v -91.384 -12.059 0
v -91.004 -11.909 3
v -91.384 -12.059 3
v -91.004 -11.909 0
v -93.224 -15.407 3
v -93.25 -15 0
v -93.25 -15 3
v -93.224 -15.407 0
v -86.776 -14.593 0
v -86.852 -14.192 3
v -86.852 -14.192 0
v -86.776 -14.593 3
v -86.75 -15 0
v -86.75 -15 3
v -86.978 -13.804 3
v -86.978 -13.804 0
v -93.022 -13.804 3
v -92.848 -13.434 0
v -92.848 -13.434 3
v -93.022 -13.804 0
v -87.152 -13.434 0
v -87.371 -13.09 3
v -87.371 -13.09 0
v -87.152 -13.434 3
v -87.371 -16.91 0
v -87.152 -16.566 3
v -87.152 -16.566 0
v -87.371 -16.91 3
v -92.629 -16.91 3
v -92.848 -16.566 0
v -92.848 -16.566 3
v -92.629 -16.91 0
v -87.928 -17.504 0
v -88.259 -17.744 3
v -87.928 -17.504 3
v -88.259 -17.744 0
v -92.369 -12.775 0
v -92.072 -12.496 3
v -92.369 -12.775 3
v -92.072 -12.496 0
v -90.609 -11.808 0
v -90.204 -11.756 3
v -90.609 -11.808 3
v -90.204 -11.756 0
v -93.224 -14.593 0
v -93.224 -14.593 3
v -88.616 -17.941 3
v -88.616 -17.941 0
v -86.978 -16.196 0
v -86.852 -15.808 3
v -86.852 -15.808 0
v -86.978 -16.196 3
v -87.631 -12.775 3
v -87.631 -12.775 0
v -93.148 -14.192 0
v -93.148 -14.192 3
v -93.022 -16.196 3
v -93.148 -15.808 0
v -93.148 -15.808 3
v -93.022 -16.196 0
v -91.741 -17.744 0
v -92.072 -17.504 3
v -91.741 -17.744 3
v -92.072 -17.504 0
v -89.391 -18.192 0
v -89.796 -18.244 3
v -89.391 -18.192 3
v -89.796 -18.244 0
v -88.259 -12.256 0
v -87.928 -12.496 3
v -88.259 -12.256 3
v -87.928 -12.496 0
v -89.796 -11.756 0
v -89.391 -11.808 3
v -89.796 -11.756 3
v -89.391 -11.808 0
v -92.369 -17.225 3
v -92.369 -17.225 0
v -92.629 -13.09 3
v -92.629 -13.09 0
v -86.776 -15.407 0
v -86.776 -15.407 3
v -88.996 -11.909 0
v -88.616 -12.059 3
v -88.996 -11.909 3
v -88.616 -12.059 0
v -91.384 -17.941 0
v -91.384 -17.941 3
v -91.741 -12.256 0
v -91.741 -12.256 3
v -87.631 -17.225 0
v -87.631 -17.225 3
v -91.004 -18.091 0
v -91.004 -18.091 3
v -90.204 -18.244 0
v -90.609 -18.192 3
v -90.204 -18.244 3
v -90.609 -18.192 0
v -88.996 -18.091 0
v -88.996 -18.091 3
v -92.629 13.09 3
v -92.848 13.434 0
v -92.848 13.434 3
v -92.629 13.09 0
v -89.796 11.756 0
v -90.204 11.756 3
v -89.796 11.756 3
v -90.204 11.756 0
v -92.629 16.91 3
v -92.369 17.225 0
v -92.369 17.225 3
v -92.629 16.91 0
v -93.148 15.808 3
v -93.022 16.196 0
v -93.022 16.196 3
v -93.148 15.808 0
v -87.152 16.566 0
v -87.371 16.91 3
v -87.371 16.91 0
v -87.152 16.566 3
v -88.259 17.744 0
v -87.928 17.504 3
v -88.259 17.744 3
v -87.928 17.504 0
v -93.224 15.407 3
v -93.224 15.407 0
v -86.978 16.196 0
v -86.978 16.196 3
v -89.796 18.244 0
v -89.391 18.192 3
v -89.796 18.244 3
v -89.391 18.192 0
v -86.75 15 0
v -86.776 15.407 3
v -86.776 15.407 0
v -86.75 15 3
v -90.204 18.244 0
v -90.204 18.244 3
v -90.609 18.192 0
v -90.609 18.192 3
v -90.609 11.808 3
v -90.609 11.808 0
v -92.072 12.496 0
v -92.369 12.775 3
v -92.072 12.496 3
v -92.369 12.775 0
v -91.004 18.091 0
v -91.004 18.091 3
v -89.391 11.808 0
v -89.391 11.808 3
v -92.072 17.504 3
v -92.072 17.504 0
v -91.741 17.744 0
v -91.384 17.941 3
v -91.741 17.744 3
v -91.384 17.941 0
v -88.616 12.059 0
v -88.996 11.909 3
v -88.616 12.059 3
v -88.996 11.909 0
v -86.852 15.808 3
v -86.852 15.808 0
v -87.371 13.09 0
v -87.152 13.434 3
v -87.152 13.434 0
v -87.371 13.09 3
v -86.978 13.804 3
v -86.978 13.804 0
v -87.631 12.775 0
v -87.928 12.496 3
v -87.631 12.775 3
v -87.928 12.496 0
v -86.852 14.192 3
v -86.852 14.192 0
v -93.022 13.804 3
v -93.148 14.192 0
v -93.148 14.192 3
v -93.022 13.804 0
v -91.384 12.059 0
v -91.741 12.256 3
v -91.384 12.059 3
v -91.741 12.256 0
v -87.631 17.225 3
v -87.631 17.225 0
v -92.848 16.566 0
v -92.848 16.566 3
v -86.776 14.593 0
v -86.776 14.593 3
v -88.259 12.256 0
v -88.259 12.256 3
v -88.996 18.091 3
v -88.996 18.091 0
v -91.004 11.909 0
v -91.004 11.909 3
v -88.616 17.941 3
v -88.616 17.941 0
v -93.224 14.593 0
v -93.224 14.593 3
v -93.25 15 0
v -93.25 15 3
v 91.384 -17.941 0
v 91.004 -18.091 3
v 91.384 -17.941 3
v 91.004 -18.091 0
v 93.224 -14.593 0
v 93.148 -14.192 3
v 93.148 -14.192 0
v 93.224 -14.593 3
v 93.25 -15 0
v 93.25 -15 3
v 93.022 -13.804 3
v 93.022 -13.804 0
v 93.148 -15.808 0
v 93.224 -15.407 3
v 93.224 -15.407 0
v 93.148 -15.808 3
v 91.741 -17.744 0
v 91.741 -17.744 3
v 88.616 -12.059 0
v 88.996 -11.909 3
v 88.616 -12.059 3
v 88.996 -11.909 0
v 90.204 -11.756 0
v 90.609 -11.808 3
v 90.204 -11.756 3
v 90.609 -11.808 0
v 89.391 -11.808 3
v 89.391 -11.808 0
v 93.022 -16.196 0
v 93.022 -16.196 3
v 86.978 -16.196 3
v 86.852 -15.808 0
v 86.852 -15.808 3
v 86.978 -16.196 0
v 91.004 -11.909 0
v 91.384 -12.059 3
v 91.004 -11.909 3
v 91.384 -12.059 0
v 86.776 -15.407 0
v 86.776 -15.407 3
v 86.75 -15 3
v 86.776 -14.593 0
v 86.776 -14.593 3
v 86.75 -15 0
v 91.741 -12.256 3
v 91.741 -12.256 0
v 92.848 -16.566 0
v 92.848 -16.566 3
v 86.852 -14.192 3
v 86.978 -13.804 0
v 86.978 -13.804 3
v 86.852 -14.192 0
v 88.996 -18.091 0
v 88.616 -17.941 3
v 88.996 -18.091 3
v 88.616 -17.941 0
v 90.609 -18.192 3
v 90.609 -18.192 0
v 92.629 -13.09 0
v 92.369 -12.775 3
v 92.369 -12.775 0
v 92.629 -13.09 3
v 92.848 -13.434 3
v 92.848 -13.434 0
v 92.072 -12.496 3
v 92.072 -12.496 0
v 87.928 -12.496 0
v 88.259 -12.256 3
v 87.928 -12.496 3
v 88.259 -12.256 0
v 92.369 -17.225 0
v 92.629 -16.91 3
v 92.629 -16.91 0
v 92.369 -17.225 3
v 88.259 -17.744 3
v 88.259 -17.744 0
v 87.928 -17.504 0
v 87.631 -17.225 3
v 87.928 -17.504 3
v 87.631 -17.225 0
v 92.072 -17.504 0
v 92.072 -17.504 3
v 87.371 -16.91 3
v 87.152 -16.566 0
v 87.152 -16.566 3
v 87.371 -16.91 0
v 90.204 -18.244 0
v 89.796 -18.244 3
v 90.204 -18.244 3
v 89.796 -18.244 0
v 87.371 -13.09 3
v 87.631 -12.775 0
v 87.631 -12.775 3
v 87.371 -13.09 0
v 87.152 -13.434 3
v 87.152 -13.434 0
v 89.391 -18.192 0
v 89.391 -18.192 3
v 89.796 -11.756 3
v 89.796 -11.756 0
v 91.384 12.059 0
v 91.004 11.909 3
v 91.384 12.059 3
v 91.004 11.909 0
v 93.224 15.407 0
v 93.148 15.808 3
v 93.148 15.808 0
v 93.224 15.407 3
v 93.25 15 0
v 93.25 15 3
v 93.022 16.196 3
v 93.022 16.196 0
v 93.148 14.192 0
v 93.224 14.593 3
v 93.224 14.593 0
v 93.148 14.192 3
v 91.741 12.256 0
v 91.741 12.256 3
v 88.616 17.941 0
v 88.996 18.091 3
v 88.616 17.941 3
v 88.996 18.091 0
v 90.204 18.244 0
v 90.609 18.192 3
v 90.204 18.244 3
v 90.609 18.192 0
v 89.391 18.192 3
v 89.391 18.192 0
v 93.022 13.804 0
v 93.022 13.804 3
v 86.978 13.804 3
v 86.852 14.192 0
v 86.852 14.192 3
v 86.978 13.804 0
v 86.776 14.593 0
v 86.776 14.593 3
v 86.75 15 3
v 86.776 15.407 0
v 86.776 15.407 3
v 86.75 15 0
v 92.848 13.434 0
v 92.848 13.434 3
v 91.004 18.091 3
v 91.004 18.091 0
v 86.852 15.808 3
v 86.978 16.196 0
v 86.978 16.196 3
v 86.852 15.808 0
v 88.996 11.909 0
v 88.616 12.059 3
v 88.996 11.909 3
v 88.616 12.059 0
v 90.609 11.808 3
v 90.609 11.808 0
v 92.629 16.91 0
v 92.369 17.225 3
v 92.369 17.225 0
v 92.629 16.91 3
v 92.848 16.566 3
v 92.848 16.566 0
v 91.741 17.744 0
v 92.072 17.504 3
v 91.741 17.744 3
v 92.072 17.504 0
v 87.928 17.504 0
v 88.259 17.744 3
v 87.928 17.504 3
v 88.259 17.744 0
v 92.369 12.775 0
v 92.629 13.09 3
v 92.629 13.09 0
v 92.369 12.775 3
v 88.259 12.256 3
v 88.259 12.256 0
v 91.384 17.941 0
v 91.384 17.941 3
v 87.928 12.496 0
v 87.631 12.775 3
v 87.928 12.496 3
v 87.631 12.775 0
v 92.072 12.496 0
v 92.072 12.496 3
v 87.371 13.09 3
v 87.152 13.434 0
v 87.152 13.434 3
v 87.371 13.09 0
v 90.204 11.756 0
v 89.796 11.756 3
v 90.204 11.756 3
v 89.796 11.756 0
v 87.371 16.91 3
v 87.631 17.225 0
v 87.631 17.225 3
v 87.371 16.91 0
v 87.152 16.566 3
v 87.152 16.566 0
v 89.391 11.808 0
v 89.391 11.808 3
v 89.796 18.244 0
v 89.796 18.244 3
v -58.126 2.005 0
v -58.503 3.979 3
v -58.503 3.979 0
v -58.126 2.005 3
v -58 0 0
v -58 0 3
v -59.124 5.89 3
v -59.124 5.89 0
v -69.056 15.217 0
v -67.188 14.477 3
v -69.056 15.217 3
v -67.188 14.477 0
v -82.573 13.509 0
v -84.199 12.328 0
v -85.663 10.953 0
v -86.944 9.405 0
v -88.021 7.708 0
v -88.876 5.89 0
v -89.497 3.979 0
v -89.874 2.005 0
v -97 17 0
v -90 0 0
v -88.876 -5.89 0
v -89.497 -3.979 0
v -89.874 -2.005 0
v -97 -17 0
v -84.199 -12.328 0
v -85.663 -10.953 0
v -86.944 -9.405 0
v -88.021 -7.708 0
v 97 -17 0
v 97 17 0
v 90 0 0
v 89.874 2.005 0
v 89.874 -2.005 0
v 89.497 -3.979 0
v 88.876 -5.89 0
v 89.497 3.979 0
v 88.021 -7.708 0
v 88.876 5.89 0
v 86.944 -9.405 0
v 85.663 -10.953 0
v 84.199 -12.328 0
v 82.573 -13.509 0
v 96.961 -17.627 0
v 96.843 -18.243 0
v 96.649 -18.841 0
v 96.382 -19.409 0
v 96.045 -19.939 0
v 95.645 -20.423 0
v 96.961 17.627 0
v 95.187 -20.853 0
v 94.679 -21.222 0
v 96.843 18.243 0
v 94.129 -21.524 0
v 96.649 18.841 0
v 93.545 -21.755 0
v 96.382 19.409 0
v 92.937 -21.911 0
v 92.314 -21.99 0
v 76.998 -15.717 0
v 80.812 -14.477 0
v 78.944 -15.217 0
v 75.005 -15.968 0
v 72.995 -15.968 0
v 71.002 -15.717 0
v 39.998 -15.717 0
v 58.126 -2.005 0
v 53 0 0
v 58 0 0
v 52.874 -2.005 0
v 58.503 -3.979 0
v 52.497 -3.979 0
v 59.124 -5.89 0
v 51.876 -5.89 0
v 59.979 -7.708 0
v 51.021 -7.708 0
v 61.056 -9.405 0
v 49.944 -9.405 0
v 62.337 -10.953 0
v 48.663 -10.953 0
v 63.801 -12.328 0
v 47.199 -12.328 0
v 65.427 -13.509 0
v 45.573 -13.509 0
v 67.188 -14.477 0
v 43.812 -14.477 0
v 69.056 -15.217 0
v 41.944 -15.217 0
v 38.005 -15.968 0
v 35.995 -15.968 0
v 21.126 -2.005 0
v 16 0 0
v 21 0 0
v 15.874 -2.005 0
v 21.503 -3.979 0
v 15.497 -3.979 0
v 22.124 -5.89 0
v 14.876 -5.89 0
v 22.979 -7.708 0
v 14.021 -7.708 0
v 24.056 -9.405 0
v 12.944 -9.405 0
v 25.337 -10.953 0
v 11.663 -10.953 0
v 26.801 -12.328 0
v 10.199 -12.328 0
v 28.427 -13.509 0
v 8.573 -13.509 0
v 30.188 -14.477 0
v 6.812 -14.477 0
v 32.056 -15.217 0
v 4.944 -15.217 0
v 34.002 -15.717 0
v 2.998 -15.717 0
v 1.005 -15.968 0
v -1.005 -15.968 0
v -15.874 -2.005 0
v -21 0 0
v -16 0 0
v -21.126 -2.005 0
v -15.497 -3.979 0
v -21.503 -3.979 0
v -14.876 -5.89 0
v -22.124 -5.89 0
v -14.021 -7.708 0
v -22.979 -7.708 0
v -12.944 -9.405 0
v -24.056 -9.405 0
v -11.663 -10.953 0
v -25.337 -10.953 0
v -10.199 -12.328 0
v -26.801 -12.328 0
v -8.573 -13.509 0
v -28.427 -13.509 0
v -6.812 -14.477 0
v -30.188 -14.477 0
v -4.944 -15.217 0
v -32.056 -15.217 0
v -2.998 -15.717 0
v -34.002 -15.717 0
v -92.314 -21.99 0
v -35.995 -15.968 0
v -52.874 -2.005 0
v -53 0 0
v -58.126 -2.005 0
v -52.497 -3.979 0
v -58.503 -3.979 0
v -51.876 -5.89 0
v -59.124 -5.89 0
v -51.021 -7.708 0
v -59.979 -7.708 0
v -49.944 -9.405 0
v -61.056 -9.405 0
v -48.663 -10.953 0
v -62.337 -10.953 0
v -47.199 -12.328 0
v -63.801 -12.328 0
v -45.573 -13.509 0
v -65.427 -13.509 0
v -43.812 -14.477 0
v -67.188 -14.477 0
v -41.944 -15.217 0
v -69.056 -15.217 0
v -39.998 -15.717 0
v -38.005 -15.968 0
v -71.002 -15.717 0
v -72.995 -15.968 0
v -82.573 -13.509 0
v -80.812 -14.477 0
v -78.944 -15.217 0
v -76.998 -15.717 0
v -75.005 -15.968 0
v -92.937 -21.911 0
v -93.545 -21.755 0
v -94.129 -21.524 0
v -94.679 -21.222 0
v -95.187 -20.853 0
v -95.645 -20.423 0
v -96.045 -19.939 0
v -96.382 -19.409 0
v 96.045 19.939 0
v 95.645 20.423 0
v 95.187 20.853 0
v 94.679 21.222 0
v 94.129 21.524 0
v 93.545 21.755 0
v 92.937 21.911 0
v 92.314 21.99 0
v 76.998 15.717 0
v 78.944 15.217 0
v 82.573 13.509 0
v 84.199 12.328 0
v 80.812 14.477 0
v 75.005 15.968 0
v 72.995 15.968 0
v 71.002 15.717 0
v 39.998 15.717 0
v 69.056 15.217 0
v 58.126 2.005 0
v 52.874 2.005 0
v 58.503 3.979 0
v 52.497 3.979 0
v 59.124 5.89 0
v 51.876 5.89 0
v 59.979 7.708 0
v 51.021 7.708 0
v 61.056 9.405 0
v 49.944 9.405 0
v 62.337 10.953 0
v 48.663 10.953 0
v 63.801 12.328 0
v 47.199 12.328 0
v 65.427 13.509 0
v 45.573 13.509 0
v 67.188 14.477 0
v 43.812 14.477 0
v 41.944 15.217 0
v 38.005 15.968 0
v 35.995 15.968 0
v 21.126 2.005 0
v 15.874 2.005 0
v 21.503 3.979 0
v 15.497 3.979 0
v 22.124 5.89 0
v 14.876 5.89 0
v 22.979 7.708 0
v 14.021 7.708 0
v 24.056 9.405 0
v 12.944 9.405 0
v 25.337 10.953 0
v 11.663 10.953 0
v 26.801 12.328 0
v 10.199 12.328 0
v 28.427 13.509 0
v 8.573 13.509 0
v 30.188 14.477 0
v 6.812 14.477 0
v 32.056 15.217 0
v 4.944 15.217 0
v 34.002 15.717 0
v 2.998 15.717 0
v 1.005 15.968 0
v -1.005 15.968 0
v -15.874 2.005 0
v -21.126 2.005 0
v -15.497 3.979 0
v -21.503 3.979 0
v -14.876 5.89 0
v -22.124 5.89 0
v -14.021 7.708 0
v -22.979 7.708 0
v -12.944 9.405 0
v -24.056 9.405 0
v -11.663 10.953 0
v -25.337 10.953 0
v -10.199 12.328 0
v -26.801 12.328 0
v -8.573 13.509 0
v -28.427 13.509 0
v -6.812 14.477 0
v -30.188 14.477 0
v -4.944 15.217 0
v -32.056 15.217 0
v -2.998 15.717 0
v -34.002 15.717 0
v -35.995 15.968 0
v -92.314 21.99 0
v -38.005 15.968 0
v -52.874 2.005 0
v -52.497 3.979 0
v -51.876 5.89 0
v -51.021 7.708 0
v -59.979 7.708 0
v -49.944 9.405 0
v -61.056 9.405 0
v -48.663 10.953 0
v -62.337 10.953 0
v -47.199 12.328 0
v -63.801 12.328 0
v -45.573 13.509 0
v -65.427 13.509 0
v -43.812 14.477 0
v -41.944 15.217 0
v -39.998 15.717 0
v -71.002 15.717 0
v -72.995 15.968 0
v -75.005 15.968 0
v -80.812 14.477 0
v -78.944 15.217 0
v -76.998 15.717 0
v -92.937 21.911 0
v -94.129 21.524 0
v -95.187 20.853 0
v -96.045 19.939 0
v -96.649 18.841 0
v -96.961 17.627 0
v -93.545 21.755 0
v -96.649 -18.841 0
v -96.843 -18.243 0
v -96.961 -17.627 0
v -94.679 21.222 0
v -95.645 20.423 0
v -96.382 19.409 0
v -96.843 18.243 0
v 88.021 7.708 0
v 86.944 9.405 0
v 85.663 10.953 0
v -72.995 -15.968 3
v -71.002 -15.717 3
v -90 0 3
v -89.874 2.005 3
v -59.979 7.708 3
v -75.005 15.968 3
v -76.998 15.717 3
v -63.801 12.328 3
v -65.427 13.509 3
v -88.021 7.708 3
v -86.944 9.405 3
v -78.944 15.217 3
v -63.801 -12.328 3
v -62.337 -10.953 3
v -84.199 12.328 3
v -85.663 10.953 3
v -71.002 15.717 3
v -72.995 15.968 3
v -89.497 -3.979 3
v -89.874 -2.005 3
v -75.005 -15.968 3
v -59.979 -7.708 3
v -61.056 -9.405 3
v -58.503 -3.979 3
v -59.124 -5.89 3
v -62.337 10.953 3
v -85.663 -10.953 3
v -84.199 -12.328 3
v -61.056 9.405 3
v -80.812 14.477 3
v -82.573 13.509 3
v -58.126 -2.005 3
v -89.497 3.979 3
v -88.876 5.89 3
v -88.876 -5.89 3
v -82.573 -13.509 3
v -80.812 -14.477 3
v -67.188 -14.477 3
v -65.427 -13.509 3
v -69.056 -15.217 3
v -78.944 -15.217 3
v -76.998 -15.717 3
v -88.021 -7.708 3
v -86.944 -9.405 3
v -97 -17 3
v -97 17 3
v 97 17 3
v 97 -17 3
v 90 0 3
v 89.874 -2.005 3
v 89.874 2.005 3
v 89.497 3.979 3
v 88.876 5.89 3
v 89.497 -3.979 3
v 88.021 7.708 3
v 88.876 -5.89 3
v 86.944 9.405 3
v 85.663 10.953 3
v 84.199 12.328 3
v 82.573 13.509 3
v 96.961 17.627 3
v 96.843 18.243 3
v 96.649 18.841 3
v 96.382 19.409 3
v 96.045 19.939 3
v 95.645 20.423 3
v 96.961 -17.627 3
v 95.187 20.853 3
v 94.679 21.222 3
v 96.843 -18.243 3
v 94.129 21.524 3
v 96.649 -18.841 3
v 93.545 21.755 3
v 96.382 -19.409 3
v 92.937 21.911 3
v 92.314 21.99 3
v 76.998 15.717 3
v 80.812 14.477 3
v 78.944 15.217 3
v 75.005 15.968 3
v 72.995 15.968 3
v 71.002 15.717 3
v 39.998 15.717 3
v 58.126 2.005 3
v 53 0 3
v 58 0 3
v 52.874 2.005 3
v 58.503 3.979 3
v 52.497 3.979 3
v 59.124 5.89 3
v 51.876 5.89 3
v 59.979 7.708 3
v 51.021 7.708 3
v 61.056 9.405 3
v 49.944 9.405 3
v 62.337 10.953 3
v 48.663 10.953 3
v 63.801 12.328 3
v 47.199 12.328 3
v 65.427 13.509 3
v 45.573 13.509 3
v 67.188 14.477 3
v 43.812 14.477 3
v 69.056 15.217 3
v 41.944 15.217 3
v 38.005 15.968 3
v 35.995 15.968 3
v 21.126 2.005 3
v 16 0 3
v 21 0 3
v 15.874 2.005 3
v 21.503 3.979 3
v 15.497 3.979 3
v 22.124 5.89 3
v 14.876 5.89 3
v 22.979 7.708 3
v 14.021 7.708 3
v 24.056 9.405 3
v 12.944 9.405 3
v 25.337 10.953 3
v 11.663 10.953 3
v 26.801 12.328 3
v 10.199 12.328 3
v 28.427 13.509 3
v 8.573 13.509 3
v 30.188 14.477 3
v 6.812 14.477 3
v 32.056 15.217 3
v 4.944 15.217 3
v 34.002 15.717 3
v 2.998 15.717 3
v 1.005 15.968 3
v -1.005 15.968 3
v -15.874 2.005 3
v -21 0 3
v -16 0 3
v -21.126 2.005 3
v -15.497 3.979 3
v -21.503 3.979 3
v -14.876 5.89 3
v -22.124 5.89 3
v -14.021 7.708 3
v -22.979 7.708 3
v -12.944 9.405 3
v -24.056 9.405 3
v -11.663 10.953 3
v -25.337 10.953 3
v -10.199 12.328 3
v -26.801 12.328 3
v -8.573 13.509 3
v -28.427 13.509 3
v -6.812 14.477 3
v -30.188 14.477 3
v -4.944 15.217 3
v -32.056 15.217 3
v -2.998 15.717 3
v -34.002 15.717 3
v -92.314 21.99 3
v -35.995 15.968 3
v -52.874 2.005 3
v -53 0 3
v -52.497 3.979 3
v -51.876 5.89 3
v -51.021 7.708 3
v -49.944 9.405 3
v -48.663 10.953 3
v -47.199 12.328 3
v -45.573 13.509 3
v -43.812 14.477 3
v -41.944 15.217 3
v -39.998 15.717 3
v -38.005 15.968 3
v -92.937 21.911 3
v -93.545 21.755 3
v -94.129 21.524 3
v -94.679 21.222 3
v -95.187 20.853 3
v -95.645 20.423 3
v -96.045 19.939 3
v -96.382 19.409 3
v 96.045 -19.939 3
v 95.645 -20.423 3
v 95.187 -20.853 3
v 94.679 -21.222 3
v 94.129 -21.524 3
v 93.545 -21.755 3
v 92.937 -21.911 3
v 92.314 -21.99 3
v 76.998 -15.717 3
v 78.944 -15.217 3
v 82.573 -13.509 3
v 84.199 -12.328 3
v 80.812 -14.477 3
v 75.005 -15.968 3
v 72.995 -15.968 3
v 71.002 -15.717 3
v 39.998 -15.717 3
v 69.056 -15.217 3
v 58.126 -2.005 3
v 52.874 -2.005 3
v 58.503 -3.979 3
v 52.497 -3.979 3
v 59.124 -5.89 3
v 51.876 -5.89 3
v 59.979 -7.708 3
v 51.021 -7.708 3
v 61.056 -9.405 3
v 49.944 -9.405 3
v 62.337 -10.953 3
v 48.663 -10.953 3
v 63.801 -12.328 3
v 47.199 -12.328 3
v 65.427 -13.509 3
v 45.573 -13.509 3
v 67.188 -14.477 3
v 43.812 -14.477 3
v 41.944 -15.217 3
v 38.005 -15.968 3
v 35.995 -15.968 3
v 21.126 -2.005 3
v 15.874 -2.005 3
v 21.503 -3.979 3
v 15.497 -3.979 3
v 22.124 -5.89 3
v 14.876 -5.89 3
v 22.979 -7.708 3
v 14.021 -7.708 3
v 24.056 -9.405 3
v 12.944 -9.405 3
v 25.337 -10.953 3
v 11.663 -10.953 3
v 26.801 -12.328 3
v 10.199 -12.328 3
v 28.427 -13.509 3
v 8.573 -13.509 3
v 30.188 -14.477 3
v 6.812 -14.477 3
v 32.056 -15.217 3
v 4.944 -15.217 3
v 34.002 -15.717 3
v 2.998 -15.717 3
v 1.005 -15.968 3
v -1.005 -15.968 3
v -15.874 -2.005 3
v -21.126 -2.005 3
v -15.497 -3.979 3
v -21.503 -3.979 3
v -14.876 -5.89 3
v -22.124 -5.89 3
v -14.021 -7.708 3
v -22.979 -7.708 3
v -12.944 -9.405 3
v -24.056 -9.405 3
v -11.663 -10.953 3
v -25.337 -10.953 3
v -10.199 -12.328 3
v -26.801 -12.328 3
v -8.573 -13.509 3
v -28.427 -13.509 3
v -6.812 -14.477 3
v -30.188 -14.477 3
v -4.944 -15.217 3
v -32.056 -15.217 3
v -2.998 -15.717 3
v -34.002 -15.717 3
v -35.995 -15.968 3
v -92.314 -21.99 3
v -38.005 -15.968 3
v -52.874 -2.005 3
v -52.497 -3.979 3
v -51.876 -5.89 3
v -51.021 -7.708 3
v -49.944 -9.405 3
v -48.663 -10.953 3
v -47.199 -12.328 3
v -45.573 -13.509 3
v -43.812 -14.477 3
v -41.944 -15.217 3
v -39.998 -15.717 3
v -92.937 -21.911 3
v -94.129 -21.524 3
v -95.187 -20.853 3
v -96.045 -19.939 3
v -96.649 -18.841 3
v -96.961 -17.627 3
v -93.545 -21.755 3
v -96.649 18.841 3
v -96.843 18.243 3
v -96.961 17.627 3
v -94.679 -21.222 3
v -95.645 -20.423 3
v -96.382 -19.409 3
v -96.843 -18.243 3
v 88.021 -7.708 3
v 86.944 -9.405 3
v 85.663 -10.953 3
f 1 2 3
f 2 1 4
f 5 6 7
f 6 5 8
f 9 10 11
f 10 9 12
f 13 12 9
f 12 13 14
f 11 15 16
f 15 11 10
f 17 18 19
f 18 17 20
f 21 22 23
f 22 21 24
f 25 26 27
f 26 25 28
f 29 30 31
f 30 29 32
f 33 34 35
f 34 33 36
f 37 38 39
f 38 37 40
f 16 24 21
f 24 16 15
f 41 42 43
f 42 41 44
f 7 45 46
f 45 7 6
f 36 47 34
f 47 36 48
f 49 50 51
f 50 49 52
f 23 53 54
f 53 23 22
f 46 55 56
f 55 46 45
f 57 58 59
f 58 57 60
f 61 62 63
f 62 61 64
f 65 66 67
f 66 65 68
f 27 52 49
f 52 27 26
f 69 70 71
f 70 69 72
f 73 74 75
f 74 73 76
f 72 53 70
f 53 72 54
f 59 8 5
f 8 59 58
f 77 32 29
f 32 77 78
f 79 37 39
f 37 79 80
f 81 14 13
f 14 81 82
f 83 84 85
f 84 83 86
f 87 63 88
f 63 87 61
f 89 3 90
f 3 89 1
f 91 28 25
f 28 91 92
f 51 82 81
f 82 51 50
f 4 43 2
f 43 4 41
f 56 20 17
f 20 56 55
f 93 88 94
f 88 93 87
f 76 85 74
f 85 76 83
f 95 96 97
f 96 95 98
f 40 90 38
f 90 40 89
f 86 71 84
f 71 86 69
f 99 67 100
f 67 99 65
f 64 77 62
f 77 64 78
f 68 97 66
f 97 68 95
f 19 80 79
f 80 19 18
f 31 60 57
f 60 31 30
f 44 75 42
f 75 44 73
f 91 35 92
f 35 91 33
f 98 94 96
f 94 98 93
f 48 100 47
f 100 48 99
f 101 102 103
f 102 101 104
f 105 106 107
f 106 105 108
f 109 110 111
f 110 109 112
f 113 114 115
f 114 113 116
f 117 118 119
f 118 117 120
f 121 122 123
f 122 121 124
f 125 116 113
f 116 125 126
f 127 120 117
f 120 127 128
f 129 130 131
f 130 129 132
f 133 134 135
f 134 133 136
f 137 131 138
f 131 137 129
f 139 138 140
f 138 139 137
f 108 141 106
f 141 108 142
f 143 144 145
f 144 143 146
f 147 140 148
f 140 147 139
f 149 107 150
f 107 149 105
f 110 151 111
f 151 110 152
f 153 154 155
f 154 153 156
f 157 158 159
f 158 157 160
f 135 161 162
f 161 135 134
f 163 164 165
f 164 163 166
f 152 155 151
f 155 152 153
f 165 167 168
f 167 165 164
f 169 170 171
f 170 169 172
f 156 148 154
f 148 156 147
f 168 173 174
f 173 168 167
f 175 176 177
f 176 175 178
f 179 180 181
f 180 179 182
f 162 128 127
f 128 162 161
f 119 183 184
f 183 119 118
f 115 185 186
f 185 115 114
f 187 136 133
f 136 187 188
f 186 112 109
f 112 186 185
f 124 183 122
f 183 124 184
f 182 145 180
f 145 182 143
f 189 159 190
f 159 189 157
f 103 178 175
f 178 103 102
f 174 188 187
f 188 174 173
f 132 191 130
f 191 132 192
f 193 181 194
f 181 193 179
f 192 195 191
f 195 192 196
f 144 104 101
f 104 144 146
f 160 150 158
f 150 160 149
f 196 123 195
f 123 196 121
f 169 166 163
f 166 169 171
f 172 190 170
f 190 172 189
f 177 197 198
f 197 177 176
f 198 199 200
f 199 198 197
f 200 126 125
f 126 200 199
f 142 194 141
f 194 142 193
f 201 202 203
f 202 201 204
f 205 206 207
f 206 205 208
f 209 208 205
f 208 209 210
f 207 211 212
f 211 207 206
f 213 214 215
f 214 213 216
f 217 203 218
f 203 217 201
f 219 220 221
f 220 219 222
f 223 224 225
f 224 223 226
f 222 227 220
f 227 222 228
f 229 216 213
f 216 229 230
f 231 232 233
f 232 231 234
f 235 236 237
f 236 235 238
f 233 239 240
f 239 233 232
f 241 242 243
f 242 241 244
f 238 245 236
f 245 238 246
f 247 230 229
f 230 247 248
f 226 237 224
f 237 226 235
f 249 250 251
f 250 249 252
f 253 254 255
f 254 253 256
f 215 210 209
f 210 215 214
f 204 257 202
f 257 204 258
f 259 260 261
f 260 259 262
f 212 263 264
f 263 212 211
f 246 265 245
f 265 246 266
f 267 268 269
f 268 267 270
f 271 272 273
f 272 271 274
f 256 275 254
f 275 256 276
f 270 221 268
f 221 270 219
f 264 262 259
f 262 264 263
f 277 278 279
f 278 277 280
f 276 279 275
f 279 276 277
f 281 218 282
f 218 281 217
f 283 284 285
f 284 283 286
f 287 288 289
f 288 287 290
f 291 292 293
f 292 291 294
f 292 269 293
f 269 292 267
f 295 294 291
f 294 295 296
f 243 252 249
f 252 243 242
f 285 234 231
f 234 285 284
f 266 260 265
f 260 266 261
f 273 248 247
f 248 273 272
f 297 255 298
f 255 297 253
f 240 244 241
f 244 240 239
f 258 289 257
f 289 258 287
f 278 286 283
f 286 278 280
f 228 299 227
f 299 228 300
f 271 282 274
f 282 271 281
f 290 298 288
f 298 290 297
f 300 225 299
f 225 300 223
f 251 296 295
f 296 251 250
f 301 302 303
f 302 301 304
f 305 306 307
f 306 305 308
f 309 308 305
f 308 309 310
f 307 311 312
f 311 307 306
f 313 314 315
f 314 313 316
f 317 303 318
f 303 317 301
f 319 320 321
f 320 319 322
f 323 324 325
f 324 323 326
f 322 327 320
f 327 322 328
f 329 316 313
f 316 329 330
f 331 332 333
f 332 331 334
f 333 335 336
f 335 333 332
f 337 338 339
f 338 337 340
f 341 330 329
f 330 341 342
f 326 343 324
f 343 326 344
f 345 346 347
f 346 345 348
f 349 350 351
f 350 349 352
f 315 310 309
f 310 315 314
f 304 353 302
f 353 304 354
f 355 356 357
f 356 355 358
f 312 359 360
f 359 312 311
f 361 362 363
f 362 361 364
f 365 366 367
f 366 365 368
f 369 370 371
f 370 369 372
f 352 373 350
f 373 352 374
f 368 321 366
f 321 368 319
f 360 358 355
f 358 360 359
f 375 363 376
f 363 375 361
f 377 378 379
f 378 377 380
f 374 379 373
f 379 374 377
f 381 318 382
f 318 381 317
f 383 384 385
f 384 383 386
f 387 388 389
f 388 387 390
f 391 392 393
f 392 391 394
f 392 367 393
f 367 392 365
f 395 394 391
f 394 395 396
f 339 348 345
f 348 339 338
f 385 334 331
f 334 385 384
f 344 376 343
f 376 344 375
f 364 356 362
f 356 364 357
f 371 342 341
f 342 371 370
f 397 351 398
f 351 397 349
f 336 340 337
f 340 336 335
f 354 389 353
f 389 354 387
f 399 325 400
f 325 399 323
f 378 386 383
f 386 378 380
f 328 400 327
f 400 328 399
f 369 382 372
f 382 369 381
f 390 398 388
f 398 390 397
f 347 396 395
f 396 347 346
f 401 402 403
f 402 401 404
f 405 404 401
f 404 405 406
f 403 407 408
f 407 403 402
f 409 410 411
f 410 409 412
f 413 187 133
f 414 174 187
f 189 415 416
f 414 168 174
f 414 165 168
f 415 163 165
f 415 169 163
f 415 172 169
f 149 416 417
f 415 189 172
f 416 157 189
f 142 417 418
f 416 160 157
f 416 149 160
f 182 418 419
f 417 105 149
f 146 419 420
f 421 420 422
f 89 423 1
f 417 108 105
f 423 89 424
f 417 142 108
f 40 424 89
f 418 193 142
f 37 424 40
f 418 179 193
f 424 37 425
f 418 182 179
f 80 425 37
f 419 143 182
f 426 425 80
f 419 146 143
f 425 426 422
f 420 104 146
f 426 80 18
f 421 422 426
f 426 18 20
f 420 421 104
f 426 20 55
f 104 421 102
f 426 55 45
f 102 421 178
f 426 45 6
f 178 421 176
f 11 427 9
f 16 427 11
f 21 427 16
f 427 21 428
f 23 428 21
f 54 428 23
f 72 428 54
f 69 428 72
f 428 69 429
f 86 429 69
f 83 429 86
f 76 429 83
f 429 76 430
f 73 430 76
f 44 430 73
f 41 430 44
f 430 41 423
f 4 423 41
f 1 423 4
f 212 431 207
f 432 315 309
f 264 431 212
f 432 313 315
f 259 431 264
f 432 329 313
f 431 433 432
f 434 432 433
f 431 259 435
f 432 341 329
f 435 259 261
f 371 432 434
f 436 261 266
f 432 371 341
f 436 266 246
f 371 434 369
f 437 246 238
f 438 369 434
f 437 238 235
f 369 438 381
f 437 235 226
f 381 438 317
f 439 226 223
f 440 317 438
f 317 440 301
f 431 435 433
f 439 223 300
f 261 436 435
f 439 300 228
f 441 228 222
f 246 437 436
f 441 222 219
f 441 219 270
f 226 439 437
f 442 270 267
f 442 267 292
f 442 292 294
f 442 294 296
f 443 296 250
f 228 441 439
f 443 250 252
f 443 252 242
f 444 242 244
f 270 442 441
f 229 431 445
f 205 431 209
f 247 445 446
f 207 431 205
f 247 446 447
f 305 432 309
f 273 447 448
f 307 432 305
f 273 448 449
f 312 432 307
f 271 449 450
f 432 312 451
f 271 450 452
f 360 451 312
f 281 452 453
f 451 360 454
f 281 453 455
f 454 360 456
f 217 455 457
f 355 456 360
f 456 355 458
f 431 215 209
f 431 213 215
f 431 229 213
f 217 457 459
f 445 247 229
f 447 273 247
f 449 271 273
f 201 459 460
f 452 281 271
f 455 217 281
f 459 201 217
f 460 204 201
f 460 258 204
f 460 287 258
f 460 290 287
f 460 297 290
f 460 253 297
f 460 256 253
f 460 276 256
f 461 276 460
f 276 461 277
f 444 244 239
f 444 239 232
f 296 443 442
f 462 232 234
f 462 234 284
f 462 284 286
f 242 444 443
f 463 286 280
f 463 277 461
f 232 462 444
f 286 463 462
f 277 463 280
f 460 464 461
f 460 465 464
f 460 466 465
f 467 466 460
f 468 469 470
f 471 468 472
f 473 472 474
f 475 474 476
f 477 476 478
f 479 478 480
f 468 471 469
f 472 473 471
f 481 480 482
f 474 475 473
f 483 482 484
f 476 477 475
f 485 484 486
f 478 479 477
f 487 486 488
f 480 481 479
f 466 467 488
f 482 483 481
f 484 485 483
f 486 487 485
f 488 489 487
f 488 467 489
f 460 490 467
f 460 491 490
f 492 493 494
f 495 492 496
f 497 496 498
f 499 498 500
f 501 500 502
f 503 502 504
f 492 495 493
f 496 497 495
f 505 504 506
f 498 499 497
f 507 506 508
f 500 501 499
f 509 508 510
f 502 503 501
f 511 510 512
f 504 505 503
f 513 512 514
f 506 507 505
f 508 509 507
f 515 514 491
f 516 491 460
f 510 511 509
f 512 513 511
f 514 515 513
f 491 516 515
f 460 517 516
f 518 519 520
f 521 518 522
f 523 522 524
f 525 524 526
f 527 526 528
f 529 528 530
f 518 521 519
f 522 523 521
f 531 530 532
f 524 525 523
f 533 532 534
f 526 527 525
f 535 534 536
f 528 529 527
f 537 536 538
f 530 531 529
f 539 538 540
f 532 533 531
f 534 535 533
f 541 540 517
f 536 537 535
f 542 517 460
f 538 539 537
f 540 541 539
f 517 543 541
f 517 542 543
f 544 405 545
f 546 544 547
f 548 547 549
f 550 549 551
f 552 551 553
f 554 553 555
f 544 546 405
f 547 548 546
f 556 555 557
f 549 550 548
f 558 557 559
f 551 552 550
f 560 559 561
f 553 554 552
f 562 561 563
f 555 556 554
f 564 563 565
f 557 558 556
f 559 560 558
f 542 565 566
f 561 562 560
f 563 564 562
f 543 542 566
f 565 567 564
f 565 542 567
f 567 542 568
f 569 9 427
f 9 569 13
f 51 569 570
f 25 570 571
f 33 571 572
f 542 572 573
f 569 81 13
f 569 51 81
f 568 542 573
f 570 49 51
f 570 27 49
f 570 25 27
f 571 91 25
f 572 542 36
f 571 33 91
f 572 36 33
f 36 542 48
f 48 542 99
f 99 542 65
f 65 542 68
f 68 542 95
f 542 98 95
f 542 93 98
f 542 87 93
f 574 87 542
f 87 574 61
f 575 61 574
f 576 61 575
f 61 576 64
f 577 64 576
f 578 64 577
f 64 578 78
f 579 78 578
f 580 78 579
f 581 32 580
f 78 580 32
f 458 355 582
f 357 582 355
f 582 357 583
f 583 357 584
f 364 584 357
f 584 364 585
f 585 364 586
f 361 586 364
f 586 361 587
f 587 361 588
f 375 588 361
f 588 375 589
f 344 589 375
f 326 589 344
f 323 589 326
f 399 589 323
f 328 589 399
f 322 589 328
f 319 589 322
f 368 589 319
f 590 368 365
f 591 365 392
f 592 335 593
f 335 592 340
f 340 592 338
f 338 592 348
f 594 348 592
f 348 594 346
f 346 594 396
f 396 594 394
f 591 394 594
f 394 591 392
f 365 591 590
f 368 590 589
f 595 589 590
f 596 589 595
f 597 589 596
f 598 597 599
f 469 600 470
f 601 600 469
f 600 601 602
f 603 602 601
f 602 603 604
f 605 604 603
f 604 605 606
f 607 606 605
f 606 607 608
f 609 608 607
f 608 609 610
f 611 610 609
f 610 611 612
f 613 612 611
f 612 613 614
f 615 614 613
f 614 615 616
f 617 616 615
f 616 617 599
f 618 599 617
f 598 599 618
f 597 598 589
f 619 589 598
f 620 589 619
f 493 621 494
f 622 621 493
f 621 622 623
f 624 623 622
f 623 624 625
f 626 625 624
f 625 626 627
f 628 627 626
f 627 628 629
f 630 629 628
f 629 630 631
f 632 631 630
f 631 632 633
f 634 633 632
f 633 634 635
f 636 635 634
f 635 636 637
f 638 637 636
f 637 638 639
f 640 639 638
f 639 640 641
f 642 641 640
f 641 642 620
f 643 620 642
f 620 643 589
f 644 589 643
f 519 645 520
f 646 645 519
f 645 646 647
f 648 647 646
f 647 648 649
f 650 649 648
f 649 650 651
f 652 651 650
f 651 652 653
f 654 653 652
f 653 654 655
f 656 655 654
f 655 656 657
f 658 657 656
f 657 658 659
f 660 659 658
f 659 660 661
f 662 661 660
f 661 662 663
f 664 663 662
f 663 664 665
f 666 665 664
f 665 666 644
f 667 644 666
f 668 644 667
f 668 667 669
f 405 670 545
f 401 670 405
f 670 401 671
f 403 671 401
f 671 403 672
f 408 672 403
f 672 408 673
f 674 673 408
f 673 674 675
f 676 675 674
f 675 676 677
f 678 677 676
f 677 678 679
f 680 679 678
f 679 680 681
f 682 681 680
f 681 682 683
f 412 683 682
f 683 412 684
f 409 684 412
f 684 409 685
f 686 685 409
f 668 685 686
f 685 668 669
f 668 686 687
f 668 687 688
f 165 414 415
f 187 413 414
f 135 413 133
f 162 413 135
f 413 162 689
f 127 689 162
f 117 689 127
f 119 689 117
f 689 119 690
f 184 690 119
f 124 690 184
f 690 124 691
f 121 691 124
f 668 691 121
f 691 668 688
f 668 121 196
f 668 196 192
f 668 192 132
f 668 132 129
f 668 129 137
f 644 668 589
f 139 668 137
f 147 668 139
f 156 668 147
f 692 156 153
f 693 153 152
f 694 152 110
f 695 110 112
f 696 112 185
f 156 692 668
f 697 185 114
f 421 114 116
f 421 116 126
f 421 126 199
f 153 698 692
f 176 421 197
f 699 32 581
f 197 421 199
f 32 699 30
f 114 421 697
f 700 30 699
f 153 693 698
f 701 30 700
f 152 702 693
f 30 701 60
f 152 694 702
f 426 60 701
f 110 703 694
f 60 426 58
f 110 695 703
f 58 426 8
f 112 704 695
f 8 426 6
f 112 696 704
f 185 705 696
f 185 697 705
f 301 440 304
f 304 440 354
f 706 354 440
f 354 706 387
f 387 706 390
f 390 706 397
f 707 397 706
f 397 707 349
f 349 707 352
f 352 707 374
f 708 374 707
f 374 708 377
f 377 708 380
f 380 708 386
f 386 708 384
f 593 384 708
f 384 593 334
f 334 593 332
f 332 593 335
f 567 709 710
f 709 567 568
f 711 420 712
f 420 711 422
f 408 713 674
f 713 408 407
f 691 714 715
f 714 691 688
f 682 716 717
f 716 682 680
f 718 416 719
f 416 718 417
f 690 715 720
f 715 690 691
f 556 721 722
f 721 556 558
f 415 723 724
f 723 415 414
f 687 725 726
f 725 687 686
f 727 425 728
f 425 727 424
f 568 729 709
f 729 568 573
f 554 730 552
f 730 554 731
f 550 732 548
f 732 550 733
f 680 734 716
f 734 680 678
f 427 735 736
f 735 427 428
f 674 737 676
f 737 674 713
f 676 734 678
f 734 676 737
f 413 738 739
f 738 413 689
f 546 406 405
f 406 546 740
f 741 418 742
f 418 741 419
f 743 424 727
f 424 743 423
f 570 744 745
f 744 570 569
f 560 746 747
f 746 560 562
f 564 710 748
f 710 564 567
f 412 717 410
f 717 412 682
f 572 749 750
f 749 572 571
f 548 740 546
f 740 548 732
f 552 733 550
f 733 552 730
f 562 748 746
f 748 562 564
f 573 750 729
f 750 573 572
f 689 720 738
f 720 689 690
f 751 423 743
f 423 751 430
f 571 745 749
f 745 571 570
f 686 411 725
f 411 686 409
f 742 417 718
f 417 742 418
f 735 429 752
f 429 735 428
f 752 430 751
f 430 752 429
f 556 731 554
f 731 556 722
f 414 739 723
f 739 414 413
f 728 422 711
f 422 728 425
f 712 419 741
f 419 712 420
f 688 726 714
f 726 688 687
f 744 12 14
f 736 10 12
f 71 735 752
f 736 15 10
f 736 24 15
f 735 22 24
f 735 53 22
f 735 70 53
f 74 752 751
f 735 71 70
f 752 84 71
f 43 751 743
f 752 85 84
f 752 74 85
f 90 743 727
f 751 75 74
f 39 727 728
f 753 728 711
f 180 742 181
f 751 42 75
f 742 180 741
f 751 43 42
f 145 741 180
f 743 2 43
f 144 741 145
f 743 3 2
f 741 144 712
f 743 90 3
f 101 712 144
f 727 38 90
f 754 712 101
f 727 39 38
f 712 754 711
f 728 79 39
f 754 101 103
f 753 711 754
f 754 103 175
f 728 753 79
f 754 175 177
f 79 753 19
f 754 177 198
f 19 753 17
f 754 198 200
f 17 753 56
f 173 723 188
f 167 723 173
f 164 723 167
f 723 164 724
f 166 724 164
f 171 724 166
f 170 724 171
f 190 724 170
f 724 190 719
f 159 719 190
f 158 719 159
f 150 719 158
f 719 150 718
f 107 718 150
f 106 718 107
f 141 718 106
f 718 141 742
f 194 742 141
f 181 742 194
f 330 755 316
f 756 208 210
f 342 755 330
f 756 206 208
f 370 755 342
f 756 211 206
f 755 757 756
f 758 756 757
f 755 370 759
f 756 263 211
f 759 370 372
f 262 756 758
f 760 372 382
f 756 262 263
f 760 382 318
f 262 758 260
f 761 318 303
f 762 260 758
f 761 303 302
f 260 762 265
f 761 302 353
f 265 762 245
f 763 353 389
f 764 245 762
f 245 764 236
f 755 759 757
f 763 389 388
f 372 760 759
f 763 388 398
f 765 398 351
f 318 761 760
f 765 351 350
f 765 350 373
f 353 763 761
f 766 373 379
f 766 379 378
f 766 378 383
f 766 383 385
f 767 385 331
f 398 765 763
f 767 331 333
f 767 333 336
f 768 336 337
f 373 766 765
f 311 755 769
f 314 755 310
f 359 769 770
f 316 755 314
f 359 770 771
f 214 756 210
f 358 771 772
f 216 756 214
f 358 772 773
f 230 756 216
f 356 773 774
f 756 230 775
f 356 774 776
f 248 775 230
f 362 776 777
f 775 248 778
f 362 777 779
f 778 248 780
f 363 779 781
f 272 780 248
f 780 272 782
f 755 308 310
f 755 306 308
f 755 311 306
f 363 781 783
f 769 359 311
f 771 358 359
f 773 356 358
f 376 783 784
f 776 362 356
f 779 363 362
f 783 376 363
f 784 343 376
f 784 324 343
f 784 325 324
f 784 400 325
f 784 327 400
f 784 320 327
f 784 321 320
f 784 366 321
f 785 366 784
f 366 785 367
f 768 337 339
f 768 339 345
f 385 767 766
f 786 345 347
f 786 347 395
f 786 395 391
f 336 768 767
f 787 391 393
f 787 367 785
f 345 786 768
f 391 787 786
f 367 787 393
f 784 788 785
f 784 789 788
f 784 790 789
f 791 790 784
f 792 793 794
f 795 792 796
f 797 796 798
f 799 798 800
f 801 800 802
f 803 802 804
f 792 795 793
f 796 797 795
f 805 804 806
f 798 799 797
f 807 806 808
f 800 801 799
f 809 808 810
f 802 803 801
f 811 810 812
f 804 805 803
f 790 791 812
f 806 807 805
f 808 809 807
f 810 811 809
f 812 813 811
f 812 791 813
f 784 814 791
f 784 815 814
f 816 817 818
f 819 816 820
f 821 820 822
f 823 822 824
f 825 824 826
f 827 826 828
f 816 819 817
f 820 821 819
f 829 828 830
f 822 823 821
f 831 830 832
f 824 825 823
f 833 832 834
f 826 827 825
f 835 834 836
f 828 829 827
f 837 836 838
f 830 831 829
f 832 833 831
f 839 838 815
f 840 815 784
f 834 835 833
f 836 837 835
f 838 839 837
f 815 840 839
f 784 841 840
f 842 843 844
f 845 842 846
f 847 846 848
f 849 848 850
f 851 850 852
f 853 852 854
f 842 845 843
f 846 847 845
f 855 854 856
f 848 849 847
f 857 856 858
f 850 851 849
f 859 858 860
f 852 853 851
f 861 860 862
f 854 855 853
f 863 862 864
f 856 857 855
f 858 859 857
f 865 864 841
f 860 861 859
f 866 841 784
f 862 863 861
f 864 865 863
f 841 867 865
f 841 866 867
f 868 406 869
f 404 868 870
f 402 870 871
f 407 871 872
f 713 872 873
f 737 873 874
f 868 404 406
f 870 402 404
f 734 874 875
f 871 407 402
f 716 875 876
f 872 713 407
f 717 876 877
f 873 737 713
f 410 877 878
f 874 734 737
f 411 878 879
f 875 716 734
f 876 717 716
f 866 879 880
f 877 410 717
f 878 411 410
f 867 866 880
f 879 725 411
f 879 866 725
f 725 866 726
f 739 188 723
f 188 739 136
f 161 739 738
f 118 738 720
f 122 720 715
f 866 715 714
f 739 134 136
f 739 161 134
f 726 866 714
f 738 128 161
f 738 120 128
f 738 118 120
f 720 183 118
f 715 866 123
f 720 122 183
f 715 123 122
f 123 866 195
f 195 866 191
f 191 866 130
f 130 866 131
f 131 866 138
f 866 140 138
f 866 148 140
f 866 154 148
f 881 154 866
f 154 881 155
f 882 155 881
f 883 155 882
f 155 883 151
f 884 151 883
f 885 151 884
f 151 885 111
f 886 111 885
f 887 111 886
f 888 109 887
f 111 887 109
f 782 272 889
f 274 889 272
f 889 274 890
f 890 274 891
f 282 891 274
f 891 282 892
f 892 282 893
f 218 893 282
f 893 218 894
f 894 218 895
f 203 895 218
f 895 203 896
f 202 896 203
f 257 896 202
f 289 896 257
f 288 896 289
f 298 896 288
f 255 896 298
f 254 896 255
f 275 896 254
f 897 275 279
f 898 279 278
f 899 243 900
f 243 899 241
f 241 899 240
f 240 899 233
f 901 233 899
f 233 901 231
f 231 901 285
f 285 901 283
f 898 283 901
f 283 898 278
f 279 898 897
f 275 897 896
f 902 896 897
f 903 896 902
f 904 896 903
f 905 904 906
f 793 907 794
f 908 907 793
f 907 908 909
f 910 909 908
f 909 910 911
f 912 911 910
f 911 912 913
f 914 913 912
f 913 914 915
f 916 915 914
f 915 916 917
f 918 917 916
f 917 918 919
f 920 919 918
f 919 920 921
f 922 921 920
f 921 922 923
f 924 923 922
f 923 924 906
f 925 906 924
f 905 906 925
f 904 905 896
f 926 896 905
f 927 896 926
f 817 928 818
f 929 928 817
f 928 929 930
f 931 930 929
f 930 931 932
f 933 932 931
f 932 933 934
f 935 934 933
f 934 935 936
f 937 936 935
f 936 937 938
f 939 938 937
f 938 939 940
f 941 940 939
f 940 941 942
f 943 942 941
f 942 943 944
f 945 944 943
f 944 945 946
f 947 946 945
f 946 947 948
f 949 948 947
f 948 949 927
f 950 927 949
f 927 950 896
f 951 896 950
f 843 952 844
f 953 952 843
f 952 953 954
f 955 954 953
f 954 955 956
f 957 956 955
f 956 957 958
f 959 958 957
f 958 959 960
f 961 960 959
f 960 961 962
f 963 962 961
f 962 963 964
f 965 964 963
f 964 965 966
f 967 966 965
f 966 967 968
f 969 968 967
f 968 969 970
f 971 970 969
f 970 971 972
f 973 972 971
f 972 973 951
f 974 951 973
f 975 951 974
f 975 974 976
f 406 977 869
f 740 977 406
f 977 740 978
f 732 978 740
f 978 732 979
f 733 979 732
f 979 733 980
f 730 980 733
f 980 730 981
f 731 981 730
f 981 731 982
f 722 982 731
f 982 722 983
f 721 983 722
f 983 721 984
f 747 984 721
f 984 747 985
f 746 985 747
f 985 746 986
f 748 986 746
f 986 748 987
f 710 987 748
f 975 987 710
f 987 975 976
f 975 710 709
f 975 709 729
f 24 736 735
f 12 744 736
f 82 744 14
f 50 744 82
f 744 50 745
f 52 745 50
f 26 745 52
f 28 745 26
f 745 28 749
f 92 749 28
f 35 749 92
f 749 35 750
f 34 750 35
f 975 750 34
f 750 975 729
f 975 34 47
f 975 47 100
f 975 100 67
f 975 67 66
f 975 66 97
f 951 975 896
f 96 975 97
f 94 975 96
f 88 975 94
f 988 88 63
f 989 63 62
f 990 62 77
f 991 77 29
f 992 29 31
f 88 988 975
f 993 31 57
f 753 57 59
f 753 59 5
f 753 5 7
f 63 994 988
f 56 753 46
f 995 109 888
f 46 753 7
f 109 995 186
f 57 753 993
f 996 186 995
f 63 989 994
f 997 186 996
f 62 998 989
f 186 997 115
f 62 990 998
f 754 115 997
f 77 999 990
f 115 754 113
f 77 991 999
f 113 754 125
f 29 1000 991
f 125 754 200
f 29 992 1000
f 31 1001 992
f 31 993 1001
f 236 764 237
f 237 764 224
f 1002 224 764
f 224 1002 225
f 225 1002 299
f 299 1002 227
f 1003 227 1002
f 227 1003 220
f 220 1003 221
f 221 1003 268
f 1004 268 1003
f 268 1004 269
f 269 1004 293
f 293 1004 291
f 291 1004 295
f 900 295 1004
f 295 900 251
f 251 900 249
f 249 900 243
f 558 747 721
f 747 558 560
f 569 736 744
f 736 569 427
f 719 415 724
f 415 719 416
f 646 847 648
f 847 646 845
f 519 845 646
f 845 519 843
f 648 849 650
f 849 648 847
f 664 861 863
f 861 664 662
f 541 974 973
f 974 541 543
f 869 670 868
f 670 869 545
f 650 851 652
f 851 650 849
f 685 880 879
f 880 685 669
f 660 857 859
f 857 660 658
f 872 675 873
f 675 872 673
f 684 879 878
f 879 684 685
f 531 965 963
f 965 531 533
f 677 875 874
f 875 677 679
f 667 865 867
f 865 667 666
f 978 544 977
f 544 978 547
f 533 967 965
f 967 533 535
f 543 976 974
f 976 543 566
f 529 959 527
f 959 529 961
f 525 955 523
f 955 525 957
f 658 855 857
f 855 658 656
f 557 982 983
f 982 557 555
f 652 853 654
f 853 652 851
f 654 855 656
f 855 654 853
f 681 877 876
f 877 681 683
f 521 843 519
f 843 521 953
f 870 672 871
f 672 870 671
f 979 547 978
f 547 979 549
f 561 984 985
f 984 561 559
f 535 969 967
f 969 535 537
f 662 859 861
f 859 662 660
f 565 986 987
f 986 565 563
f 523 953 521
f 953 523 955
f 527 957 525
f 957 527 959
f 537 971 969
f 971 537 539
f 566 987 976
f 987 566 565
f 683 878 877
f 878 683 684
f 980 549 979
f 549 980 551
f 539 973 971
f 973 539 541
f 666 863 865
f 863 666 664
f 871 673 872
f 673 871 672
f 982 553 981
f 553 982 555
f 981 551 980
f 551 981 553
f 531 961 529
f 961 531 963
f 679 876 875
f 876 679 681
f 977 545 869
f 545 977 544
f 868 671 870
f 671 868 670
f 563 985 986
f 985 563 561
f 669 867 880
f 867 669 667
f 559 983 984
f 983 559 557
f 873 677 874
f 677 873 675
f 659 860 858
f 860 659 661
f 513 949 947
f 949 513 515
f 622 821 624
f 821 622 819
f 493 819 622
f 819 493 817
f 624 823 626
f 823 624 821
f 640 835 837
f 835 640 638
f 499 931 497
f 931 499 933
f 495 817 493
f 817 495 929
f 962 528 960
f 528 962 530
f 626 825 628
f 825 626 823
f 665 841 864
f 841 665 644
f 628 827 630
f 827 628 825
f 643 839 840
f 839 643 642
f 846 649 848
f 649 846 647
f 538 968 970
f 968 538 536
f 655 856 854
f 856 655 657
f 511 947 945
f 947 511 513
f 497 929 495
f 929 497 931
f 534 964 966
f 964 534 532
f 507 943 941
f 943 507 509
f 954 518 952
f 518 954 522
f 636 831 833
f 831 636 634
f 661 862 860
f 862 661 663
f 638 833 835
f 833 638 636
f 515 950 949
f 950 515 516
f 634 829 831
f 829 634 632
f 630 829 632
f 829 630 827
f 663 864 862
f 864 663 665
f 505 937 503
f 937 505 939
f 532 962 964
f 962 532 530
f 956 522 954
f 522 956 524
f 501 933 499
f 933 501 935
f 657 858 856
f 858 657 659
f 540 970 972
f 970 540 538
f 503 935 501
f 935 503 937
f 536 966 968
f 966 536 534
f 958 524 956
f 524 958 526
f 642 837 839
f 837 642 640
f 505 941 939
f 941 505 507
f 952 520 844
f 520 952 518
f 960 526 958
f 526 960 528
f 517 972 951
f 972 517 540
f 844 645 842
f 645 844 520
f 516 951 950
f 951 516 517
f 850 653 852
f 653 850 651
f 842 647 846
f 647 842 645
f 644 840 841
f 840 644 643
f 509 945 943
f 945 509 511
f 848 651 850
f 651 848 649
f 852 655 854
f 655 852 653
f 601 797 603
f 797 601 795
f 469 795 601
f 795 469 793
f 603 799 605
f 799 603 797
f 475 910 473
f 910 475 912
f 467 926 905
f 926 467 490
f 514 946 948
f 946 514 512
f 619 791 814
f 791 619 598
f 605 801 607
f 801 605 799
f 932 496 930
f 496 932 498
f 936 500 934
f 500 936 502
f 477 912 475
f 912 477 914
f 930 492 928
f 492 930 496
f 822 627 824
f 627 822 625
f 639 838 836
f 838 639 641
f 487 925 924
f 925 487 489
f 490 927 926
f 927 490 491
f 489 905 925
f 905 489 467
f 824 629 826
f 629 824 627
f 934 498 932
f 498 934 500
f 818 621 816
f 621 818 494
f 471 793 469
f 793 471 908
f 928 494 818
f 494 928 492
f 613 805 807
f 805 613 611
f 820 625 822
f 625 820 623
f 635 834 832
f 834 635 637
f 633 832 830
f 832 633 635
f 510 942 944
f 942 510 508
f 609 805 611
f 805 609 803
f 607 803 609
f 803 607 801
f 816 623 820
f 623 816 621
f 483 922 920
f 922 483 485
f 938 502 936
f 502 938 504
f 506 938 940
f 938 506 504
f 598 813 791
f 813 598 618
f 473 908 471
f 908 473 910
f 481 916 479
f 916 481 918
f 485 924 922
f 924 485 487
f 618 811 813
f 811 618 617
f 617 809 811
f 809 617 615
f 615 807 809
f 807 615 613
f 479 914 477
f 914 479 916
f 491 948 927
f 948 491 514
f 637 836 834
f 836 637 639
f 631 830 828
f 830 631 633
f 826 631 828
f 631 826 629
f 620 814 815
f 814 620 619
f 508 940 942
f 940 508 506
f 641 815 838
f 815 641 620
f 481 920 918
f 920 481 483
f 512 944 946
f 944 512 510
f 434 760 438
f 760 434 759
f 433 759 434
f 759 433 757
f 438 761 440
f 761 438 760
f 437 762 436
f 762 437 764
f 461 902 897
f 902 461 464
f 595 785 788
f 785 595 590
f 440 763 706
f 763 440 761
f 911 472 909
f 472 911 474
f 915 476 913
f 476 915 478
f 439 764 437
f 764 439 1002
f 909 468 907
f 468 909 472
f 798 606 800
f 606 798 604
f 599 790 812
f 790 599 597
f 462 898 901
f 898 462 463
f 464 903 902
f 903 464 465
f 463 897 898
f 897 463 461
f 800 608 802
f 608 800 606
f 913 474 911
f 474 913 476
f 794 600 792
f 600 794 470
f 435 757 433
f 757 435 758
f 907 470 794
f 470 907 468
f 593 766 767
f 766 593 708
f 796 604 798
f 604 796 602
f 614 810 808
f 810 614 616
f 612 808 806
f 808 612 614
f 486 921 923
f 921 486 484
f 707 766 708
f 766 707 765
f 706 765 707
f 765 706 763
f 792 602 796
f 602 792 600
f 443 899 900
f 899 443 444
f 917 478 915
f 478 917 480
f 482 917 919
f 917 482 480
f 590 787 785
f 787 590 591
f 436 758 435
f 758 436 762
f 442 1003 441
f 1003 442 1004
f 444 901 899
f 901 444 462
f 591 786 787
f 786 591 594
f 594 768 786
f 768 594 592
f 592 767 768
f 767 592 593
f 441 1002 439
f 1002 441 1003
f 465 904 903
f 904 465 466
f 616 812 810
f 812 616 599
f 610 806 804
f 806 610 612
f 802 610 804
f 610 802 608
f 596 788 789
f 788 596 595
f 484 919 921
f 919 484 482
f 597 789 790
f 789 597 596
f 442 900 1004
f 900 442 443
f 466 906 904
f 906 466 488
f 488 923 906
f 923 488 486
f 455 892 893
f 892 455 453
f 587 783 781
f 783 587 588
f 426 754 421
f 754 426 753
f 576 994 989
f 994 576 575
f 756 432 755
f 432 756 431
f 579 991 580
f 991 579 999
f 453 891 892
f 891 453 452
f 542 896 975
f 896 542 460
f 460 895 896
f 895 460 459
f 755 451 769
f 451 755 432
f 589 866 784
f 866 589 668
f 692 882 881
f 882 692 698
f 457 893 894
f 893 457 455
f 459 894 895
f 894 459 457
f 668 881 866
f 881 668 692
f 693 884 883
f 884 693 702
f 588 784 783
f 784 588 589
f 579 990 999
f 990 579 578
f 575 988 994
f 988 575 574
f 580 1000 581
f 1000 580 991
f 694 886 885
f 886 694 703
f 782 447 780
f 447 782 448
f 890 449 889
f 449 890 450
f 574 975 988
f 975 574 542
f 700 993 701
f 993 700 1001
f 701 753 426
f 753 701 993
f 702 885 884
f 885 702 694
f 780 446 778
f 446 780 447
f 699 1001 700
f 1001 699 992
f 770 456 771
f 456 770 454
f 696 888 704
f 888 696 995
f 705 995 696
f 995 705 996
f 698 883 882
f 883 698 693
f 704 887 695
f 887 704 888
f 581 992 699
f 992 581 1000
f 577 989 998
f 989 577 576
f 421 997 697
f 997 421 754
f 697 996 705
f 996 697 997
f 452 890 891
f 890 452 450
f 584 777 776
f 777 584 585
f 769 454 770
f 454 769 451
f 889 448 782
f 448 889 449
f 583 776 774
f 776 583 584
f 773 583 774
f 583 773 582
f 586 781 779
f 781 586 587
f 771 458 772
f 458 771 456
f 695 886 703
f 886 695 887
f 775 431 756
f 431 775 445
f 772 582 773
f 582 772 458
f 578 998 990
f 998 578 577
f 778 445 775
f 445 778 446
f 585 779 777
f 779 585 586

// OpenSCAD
$fn = 50;


difference() {
	union() {
		hull() {
			translate(v = [-92.0000000000, 17.0000000000, 0]) {
				cylinder(h = 3, r = 5);
			}
			translate(v = [92.0000000000, 17.0000000000, 0]) {
				cylinder(h = 3, r = 5);
			}
			translate(v = [-92.0000000000, -17.0000000000, 0]) {
				cylinder(h = 3, r = 5);
			}
			translate(v = [92.0000000000, -17.0000000000, 0]) {
				cylinder(h = 3, r = 5);
			}
		}
	}
	union() {
		#translate(v = [-90.0000000000, -15.0000000000, -100.0000000000]) {
			cylinder(h = 200, r = 3.2500000000);
		}
		#translate(v = [-90.0000000000, 15.0000000000, -100.0000000000]) {
			cylinder(h = 200, r = 3.2500000000);
		}
		#translate(v = [90.0000000000, -15.0000000000, -100.0000000000]) {
			cylinder(h = 200, r = 3.2500000000);
		}
		#translate(v = [90.0000000000, 15.0000000000, -100.0000000000]) {
			cylinder(h = 200, r = 3.2500000000);
		}
		#translate(v = [-74.0000000000, 0, 0]) {
			cylinder(h = 3, r = 16.0000000000);
		}
		#translate(v = [-37.0000000000, 0, 0]) {
			cylinder(h = 3, r = 16.0000000000);
		}
		#cylinder(h = 3, r = 16.0000000000);
		#translate(v = [37.0000000000, 0, 0]) {
			cylinder(h = 3, r = 16.0000000000);
		}
		#translate(v = [74.0000000000, 0, 0]) {
			cylinder(h = 3, r = 16.0000000000);
		}
	}
}
